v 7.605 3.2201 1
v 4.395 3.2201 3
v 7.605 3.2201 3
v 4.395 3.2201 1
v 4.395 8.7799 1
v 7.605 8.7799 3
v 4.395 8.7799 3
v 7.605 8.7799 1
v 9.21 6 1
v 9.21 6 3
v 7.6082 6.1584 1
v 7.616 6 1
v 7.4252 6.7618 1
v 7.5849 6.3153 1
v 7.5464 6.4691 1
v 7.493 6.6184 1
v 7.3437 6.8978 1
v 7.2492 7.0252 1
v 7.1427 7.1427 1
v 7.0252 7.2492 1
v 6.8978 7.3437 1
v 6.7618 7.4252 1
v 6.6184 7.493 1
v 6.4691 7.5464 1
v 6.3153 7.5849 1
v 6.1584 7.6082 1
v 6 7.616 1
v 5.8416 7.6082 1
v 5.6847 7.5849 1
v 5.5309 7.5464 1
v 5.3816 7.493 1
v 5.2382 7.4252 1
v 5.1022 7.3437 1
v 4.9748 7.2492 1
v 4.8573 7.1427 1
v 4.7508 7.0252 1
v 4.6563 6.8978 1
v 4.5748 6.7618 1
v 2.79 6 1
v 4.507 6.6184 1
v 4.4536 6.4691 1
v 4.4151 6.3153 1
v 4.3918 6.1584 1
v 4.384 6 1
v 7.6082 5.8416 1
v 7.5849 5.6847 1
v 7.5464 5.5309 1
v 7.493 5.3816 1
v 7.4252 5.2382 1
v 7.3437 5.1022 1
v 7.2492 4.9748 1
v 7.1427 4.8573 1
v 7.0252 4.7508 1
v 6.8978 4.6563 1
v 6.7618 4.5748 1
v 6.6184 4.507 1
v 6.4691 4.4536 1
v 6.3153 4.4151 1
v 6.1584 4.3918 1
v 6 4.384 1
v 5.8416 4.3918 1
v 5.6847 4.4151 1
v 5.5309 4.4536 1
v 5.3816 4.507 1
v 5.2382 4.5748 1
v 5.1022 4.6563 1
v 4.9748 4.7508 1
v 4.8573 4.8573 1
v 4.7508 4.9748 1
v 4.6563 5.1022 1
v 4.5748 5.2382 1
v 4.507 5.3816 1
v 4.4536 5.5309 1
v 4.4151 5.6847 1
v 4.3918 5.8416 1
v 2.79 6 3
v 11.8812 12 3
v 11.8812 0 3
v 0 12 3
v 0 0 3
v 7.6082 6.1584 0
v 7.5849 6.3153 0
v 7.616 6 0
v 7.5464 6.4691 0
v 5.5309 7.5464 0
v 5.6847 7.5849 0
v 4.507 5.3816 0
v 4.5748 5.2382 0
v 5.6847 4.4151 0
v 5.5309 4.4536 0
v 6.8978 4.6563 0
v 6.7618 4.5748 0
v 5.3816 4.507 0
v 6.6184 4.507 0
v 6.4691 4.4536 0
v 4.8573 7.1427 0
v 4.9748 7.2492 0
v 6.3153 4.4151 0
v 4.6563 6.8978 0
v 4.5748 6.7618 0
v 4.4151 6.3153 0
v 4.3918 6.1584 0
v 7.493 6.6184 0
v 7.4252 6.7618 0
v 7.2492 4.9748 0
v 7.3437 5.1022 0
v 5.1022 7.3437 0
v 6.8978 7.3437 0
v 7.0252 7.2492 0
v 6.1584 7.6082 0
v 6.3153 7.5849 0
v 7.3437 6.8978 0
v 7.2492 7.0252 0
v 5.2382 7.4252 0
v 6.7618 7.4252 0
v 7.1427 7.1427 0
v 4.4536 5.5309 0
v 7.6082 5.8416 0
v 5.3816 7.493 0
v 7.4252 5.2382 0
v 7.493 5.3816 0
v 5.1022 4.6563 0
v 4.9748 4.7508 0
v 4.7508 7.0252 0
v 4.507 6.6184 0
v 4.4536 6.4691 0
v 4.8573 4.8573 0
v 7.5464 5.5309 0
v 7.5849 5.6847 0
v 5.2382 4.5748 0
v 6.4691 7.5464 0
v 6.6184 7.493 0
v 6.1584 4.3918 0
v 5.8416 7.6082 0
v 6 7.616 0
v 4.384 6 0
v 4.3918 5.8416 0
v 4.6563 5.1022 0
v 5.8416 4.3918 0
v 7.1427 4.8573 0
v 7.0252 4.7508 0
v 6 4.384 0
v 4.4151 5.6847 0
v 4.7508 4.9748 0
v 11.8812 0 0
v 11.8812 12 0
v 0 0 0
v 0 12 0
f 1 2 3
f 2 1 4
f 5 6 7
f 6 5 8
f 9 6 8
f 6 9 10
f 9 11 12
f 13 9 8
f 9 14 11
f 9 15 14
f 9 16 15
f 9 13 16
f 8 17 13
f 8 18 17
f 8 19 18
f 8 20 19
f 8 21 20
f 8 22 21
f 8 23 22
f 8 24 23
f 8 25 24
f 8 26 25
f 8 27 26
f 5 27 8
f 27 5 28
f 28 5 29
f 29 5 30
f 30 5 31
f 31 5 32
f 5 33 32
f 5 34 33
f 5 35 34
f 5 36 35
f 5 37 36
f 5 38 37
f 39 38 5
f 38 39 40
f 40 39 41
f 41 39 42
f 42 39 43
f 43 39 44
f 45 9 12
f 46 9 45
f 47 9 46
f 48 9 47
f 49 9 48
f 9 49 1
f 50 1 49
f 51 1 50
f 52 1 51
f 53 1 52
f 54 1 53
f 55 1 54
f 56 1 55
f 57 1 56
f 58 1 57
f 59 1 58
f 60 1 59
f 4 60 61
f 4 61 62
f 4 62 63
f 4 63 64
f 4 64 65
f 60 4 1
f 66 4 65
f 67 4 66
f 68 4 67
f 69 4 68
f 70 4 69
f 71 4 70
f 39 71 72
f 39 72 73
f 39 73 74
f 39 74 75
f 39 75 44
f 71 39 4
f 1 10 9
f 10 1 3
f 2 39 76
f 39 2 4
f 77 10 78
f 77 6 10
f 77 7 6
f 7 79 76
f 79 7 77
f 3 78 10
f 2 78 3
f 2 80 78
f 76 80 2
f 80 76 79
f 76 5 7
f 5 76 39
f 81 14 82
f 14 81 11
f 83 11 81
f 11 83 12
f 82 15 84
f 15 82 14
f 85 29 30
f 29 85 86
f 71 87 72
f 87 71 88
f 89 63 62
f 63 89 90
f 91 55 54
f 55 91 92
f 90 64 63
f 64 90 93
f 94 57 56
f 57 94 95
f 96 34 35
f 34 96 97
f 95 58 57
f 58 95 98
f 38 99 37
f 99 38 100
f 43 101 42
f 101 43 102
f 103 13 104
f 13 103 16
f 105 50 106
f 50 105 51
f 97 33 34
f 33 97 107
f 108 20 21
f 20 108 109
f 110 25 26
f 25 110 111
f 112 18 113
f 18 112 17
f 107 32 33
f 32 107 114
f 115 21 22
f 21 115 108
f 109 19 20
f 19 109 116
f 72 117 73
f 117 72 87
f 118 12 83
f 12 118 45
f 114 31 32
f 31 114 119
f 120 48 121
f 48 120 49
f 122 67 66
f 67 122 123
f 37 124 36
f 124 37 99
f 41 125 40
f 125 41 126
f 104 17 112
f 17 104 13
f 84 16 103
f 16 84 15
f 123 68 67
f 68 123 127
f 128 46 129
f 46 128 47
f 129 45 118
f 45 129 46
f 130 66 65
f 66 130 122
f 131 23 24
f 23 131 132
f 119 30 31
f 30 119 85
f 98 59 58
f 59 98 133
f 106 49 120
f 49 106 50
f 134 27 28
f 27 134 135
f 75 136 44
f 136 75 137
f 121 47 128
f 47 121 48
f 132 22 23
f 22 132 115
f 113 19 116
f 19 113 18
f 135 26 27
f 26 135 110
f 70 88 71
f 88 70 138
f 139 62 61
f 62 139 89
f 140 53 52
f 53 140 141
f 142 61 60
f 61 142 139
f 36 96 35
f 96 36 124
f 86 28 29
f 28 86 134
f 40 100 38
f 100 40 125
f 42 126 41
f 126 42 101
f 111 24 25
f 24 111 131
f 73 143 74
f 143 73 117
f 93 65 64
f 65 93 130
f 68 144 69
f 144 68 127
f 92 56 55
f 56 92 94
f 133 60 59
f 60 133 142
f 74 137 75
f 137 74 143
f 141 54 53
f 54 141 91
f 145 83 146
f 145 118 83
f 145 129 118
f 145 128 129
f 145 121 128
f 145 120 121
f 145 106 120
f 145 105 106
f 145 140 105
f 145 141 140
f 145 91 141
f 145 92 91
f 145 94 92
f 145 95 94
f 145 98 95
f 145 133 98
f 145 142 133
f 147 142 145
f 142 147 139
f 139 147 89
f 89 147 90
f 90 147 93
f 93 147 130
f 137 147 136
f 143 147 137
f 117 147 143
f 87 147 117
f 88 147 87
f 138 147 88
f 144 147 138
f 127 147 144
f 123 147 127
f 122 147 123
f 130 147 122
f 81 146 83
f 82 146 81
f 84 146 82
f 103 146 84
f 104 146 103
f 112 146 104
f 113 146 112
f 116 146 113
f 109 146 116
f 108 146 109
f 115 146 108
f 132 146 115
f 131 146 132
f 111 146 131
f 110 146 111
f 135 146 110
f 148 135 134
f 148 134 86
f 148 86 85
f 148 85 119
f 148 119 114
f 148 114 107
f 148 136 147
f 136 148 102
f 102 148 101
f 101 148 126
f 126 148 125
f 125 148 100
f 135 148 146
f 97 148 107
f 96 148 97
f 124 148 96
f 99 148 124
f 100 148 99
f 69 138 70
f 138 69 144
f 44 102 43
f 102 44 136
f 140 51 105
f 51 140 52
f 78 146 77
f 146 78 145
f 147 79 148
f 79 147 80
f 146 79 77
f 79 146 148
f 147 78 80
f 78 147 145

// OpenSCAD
$fn=64;

difference() {
  cube([12/1.01, 12, 3]);
  union() {
    translate([6, 6, 1]) cylinder(h=2, d=6*1.07, $fn=6);
    translate([6, 6, 0]) cylinder(h=1, d=3.2*1.01);
  }
}
